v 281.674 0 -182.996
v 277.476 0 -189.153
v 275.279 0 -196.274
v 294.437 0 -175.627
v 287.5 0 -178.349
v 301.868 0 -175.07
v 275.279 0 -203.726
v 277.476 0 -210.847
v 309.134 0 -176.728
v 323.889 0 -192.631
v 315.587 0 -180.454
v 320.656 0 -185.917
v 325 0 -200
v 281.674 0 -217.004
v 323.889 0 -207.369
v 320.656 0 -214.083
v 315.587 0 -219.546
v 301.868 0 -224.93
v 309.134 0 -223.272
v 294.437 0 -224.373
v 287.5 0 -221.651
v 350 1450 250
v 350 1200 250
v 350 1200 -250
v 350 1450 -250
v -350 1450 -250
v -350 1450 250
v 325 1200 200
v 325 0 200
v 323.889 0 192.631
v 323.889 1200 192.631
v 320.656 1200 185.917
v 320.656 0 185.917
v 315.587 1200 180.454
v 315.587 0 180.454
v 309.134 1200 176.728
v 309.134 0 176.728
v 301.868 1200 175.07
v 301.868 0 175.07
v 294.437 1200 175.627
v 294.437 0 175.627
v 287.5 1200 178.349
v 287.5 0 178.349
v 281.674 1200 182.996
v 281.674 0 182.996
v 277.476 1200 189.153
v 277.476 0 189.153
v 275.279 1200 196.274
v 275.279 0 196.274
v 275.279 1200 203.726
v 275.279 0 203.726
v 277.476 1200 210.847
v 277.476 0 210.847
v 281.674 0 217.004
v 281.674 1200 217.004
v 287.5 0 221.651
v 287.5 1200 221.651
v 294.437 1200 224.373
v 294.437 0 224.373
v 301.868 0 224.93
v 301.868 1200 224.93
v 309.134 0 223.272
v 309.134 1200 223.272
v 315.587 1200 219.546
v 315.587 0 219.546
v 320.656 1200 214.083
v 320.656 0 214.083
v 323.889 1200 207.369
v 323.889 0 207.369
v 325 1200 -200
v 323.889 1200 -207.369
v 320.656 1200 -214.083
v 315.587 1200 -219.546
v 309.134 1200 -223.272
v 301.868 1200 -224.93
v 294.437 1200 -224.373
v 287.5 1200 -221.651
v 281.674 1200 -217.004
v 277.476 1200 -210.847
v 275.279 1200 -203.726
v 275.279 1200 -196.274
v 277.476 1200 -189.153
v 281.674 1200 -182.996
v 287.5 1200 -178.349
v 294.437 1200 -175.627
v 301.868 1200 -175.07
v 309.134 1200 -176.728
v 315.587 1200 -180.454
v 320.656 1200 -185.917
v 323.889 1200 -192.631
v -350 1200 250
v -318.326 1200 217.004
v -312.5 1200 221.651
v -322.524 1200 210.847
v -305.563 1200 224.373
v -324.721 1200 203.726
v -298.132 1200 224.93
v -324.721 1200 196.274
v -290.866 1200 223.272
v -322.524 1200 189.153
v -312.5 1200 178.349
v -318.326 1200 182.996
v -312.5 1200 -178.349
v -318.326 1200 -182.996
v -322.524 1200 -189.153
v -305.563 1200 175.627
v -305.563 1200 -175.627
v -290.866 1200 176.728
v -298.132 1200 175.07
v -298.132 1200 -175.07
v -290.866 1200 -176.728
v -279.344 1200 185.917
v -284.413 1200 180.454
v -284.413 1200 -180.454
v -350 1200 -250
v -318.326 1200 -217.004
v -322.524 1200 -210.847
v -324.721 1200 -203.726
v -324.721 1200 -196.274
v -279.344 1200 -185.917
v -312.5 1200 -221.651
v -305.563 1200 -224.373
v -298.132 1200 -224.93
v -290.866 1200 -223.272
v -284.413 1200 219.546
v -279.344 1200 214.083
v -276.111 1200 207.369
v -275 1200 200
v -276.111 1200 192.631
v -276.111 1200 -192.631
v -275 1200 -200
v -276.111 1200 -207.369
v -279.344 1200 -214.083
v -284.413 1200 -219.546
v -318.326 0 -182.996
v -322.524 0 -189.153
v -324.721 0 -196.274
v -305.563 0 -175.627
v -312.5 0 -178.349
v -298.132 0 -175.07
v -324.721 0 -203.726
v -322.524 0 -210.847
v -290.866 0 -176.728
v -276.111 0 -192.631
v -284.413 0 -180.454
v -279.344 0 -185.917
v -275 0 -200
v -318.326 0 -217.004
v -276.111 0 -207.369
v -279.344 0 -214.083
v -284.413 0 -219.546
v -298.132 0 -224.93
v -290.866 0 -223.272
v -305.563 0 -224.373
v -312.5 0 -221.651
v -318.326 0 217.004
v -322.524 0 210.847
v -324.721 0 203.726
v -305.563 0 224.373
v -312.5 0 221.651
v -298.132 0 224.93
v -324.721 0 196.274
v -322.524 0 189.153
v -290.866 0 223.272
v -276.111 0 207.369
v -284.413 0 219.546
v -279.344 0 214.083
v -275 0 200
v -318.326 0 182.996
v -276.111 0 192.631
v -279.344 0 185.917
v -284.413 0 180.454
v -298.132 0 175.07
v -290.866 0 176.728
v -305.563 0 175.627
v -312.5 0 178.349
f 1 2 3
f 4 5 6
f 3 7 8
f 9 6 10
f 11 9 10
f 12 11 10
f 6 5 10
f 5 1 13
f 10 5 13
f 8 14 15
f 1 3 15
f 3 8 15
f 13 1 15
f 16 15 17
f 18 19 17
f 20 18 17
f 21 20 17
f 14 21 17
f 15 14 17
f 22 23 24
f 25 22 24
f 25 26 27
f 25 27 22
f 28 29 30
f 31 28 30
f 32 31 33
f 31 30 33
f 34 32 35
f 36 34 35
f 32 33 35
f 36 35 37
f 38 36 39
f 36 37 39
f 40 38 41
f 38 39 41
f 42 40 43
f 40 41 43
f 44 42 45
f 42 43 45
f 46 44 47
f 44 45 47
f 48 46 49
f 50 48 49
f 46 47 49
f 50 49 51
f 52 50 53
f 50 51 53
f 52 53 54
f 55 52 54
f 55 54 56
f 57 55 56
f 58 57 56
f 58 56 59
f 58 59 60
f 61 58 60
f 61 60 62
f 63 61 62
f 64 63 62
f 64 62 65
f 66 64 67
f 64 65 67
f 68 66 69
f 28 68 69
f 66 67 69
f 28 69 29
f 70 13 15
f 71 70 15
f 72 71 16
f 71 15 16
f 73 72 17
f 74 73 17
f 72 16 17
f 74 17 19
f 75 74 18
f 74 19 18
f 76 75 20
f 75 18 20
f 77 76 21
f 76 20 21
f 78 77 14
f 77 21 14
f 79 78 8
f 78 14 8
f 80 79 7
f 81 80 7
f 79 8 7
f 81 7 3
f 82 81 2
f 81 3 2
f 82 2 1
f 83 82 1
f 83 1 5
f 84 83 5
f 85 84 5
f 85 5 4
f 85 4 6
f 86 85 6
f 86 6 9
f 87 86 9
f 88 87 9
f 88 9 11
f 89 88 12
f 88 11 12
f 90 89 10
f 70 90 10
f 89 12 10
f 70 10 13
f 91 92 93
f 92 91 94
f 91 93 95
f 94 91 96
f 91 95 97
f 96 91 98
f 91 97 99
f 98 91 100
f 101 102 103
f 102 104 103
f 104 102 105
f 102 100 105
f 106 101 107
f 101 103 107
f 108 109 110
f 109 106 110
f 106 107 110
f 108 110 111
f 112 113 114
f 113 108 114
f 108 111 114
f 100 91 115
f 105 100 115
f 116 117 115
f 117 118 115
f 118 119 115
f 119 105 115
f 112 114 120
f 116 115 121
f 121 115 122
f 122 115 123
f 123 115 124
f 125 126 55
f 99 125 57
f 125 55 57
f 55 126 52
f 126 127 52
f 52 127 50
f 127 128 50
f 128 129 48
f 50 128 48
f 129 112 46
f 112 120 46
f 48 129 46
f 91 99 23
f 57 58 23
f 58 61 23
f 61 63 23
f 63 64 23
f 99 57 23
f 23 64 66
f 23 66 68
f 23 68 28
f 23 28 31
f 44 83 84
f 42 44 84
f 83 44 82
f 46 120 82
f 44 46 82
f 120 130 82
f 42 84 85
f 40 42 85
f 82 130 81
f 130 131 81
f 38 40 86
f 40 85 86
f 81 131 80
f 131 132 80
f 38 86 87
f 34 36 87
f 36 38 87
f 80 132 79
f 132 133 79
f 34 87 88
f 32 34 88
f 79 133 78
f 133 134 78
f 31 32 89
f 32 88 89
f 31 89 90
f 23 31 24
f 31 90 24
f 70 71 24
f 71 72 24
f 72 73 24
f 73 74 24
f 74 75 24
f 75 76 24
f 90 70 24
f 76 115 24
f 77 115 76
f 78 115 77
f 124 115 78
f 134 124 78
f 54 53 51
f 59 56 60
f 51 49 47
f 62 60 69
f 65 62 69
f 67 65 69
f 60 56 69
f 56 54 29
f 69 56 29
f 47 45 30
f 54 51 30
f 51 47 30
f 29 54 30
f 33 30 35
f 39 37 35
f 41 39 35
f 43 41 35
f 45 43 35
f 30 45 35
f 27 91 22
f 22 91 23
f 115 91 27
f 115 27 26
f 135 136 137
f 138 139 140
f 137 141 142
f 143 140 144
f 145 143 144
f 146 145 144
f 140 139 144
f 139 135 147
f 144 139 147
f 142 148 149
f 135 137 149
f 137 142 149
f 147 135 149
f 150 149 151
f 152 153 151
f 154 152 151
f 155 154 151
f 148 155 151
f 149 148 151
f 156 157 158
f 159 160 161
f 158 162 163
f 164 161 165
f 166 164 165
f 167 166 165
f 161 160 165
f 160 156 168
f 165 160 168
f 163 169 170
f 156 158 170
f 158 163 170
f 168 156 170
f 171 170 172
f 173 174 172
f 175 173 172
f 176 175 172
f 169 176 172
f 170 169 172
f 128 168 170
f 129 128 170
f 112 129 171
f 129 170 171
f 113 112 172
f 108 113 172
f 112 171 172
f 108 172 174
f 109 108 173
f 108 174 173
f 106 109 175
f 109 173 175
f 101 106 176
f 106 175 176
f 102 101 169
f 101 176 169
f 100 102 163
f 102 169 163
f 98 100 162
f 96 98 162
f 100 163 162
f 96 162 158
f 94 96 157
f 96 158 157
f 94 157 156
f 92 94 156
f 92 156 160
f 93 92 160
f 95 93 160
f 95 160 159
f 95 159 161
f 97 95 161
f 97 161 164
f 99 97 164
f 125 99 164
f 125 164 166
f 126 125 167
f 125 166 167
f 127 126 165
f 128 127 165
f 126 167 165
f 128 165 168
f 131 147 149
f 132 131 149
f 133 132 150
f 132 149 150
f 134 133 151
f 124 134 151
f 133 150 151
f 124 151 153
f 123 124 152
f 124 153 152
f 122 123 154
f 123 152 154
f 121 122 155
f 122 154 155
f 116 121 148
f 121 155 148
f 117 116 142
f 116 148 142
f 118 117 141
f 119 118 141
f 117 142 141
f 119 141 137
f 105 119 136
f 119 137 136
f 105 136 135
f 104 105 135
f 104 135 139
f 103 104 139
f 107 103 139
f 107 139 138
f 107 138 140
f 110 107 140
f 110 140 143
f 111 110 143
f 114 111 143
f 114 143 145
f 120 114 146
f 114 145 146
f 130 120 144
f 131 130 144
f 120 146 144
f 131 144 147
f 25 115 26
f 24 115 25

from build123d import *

# Parameters (mm, degrees)
SKETCH_1_R        = 25
EXTRUDE_1_DEPTH   = 1200
EXTRUDE_1_2_DEPTH = 1200
EXTRUDE_1_3_DEPTH = 1200
EXTRUDE_1_4_DEPTH = 1200
SKETCH_2_W        = 700
SKETCH_2_H        = 500
EXTRUDE_2_DEPTH   = 250


with BuildPart() as part:
    # 草图1 → 凸台-拉伸1 (new body)
    with BuildSketch(Plane(origin=(0, 0, 0), x_dir=(1, 0, 0), z_dir=(0, 1, 0))):
        with Locations((-300, 200)):
            Circle(SKETCH_1_R)
    extrude(amount=EXTRUDE_1_DEPTH)



with BuildPart() as body_2:
    # 草图1 → Extrude 1 2 (new body)
    with BuildSketch(Plane(origin=(0, 0, 0), x_dir=(1, 0, 0), z_dir=(0, 1, 0))):
        with Locations((300, 200)):
            Circle(SKETCH_1_R)
    extrude(amount=EXTRUDE_1_2_DEPTH)


with BuildPart() as body_3:
    # 草图1 → Extrude 1 3 (new body)
    with BuildSketch(Plane(origin=(0, 0, 0), x_dir=(1, 0, 0), z_dir=(0, 1, 0))):
        with Locations((300, -200)):
            Circle(SKETCH_1_R)
    extrude(amount=EXTRUDE_1_3_DEPTH)


with BuildPart() as body_4:
    # 草图1 → Extrude 1 4 (new body)
    with BuildSketch(Plane(origin=(0, 0, 0), x_dir=(1, 0, 0), z_dir=(0, 1, 0))):
        with Locations((-300, -200)):
            Circle(SKETCH_1_R)
    extrude(amount=EXTRUDE_1_4_DEPTH)


with BuildPart() as part_1:
    add(part.part)

    add(body_2.part)  # 凸台-拉伸2 merges body 2

    add(body_3.part)  # 凸台-拉伸2 merges body 3

    add(body_4.part)  # 凸台-拉伸2 merges body 4
    # 草图2 → 凸台-拉伸2 (add)
    with BuildSketch(Plane(origin=(0, 1200, 0), x_dir=(1, 0, 0), z_dir=(0, 1, 0))):
        Rectangle(SKETCH_2_W, SKETCH_2_H)
    extrude(amount=EXTRUDE_2_DEPTH)


solid = part_1.part
